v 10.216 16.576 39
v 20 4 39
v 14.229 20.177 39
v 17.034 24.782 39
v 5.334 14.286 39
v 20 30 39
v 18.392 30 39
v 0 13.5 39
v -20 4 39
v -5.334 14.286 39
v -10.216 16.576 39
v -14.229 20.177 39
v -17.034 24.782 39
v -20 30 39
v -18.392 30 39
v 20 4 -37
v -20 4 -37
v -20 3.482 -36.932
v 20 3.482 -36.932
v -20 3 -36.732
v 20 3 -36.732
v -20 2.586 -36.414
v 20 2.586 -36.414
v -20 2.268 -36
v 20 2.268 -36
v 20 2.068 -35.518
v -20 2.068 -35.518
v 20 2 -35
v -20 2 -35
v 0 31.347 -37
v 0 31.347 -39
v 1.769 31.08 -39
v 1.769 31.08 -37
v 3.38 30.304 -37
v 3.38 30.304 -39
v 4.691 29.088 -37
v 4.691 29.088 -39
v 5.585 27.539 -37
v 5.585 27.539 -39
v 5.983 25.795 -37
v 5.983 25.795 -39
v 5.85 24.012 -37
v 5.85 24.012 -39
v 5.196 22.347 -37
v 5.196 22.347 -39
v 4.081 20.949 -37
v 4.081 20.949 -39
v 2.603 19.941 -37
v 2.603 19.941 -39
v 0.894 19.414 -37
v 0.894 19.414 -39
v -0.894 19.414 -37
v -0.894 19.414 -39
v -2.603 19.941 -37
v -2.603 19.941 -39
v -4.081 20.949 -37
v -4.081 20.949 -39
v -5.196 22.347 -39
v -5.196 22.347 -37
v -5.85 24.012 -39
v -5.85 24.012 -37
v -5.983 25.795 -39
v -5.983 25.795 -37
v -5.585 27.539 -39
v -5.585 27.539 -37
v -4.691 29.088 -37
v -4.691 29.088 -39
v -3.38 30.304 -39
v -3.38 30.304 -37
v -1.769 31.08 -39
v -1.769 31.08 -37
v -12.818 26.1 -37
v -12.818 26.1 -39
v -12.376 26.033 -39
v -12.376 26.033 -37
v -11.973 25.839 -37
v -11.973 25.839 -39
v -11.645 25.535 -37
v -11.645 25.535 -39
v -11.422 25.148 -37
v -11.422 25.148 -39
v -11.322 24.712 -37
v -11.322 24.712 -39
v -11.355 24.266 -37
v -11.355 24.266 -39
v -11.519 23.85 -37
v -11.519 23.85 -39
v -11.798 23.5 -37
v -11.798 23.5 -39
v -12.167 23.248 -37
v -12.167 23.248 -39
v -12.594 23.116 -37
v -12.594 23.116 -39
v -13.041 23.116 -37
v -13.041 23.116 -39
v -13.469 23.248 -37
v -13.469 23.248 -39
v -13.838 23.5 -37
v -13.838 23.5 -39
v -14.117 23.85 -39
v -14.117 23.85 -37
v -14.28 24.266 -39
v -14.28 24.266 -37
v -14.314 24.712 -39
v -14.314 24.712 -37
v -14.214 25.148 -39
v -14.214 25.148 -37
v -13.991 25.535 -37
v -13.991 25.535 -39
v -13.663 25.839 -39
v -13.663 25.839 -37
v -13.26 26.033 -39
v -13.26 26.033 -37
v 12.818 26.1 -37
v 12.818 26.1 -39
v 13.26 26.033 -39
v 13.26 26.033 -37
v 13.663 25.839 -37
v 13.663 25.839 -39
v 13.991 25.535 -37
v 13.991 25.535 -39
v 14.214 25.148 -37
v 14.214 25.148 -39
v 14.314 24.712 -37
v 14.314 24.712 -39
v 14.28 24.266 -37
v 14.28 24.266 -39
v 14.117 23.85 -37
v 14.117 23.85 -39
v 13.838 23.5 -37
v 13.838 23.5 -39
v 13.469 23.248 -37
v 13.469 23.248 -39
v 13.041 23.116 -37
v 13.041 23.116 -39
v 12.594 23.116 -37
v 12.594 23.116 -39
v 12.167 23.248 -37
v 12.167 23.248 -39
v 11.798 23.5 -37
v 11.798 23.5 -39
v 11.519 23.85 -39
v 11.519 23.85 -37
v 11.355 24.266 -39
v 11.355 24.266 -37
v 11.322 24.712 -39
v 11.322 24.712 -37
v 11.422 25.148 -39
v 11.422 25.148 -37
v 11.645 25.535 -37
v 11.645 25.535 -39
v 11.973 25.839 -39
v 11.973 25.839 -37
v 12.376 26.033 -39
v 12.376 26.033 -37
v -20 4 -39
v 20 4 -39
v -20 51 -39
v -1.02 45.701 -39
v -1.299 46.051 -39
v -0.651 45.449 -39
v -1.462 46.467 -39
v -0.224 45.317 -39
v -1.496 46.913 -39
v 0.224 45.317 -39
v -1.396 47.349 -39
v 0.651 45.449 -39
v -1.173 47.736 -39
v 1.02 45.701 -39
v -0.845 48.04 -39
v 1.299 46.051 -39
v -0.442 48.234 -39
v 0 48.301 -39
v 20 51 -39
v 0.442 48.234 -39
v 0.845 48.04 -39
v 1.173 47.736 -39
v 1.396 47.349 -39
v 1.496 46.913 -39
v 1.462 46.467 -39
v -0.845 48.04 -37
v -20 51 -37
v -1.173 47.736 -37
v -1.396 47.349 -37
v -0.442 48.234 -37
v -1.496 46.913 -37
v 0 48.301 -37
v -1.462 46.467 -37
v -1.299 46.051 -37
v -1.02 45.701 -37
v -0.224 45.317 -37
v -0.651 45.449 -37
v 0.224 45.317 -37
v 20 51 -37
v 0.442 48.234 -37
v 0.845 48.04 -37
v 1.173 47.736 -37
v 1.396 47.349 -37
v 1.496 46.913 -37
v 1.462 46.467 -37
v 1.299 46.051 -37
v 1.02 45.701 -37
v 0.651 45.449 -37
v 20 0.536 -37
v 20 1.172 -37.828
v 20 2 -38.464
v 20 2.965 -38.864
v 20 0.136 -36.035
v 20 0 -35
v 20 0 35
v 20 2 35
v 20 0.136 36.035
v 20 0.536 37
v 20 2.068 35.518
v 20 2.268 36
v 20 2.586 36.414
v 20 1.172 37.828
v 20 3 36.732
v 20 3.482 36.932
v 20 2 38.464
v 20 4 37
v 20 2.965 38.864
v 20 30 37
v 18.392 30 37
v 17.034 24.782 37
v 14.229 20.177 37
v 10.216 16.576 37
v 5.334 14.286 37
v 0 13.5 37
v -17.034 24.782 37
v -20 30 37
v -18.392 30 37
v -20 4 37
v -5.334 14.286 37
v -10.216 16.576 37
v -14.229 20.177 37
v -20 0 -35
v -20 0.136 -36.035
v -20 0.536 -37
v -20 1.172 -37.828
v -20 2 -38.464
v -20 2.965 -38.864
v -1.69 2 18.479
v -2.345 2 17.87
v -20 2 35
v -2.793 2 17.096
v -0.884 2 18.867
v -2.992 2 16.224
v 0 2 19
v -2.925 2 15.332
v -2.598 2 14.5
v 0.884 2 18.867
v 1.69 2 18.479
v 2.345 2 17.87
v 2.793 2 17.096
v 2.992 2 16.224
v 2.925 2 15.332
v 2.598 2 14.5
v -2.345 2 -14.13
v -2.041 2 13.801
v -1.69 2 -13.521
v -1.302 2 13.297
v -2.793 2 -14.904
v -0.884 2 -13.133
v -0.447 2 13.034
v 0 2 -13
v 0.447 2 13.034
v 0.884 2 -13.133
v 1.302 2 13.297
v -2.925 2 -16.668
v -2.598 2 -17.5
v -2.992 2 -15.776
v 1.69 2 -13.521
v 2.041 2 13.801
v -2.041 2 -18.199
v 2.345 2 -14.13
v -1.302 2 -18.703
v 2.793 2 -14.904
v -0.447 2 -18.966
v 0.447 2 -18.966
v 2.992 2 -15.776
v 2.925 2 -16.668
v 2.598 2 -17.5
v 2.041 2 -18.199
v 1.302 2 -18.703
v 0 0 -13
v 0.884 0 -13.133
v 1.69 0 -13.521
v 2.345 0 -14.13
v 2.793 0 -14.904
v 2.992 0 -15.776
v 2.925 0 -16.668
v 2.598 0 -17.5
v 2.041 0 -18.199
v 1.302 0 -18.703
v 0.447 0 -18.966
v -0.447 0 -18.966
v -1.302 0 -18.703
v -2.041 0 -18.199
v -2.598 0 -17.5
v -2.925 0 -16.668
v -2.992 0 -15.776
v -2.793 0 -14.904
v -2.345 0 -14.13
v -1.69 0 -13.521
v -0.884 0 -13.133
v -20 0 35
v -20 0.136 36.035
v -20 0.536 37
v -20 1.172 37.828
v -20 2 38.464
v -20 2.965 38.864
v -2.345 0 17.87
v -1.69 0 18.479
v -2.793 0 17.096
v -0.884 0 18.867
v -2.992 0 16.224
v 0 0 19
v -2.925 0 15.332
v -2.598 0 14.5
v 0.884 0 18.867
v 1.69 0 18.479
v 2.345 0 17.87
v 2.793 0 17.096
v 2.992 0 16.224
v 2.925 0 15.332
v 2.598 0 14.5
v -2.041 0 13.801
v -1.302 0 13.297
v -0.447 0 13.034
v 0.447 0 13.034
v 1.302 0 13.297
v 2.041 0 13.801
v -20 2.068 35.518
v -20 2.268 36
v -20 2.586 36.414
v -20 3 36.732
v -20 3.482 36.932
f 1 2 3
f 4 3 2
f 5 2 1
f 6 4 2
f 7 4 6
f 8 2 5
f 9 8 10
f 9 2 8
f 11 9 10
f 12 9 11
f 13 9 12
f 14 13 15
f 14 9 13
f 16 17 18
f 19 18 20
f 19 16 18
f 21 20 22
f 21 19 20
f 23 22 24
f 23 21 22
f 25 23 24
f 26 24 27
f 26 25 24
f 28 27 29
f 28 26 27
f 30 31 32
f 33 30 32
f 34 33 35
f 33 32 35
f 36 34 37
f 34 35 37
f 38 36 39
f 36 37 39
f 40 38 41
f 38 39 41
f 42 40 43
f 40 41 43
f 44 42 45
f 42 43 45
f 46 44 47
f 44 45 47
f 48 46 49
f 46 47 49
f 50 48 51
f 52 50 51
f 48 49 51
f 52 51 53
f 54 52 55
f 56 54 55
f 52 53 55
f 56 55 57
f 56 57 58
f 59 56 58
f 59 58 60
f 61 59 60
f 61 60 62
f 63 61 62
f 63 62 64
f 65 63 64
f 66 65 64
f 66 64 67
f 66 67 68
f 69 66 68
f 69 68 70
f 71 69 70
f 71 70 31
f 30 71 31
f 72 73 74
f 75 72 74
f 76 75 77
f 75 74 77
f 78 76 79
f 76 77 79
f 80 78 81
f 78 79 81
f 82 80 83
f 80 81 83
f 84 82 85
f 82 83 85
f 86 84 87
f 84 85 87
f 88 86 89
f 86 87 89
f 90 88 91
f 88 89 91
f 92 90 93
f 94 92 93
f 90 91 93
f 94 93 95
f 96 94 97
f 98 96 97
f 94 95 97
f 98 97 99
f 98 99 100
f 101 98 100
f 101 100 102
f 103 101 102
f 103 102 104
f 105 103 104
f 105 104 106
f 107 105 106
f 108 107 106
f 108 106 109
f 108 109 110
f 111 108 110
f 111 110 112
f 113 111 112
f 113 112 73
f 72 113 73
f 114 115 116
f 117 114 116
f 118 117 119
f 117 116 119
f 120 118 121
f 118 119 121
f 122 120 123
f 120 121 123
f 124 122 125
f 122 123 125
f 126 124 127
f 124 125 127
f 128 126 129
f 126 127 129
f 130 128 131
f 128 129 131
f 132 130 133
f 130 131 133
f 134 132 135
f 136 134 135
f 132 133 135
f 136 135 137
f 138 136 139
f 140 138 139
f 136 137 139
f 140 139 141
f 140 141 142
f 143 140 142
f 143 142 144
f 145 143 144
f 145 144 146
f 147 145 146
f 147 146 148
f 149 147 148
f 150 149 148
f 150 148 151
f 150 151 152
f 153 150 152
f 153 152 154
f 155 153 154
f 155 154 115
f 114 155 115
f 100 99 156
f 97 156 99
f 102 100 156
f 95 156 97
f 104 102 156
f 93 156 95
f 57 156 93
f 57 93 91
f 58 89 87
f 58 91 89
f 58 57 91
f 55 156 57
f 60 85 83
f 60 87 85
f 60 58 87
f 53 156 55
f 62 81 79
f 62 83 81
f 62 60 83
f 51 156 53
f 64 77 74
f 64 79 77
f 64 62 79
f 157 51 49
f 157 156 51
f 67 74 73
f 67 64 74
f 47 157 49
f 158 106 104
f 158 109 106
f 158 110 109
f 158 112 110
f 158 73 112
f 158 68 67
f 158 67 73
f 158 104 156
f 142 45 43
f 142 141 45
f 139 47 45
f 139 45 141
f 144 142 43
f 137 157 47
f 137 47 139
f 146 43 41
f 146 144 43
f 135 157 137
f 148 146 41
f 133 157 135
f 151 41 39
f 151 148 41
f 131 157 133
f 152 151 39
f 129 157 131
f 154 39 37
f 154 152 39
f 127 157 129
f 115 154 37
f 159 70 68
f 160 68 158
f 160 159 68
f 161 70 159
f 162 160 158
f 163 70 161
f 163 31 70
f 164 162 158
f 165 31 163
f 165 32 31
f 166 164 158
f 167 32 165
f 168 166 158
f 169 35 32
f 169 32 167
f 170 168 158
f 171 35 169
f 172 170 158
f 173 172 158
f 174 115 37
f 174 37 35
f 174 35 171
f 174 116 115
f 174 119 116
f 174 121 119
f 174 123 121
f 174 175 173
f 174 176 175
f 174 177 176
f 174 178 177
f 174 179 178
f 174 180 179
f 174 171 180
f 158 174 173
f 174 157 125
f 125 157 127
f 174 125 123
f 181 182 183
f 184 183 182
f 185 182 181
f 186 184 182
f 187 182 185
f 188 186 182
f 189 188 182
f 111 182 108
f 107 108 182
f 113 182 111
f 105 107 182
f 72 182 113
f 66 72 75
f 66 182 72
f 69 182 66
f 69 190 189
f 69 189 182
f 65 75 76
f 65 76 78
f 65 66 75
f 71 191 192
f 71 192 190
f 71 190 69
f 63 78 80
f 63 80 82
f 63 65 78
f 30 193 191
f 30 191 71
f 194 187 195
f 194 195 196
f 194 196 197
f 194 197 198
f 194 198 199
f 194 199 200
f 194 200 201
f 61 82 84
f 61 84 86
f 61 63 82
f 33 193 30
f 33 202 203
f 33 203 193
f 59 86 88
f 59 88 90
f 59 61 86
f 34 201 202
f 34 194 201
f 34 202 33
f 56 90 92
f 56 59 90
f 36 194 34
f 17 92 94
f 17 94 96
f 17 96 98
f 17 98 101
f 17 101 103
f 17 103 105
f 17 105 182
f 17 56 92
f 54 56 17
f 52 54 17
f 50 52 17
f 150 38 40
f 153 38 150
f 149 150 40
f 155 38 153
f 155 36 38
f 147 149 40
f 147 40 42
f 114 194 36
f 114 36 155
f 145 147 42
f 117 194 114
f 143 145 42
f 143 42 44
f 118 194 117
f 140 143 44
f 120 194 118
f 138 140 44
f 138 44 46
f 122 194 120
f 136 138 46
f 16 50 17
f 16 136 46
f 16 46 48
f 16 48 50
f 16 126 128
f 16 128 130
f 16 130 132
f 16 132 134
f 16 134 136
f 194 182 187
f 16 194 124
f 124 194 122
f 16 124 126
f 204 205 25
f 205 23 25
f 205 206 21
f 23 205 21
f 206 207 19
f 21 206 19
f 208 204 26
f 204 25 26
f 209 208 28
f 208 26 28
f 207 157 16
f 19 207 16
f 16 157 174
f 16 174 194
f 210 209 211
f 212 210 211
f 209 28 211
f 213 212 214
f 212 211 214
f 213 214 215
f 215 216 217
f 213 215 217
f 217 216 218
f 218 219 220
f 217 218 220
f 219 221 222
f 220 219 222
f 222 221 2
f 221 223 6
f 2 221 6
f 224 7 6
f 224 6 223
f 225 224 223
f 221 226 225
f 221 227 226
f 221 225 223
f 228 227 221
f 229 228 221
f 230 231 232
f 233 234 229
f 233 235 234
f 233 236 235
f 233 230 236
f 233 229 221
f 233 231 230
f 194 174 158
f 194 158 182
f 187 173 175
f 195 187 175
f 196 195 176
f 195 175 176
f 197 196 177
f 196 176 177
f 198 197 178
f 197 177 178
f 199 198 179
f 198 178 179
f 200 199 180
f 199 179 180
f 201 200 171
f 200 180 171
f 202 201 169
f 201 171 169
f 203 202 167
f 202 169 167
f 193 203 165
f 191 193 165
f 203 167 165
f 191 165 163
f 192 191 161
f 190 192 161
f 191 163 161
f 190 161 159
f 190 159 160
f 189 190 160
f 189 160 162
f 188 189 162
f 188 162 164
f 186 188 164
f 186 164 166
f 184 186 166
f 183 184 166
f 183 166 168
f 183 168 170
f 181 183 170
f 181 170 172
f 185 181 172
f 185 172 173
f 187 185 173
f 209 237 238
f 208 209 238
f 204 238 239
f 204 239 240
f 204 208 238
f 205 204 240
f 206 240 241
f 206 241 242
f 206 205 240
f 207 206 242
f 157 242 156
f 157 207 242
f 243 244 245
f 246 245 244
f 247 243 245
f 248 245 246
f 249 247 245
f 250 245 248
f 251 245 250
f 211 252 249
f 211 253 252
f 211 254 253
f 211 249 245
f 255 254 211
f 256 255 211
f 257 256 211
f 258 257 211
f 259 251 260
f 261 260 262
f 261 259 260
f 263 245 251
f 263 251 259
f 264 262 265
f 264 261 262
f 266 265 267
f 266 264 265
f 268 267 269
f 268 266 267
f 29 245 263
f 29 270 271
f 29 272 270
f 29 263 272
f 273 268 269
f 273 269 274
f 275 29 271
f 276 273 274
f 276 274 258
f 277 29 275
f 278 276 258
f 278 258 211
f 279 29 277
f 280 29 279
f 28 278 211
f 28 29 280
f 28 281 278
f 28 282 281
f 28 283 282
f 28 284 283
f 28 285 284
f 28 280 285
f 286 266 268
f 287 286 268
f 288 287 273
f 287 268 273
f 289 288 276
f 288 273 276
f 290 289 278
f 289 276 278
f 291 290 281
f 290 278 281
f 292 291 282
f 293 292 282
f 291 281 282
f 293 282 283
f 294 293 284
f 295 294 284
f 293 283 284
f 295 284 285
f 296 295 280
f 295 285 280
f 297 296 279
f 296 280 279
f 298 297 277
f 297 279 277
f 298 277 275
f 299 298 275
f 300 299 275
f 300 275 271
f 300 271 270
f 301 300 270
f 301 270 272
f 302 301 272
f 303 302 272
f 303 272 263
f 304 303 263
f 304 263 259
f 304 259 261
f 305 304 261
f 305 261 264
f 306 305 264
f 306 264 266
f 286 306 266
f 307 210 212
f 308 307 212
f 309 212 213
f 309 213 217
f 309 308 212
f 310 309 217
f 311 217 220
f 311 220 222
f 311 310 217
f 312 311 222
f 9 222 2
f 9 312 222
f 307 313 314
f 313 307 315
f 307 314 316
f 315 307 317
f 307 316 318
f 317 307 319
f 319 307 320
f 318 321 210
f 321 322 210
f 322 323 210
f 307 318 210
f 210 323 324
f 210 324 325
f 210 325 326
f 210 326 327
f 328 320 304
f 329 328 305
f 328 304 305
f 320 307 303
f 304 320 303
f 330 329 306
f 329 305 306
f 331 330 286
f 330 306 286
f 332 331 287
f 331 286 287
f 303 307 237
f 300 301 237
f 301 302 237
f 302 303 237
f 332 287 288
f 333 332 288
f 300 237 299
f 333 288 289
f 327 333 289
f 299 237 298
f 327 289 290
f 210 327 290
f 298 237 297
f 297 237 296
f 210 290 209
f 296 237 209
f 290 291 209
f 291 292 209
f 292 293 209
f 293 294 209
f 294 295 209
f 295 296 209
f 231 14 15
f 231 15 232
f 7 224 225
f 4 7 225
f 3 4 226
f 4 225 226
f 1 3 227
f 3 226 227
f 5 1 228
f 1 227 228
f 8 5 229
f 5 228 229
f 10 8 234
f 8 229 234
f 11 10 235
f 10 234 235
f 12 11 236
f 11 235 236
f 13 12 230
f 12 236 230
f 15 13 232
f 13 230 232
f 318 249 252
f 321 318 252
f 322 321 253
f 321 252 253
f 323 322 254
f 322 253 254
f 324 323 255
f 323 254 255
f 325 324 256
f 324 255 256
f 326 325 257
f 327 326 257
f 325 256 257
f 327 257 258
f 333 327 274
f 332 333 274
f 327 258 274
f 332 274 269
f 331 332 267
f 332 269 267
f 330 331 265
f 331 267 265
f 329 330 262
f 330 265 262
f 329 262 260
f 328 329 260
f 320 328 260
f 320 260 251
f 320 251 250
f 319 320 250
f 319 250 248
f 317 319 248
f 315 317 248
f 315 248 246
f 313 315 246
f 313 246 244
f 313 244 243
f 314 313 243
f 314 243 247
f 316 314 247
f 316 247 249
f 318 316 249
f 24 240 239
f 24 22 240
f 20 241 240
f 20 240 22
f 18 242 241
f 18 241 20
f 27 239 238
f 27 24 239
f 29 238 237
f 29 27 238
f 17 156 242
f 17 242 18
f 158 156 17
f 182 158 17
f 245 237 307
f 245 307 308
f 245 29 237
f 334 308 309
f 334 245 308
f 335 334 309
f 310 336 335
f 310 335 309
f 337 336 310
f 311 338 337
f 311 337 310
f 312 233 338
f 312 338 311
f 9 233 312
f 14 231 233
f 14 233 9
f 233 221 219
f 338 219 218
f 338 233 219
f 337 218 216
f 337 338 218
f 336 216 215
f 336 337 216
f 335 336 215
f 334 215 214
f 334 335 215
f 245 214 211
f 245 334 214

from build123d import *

# Parameters (mm, degrees)
SKETCH44_W          = 40
SKETCH44_H          = 70
BOSS_EXTRUDE1_DEPTH = 2
EDGE_FLANGE6_DEPTH  = 40
SKETCH52_R          = 6
SKETCH52_R_2        = 1.5
CUT_EXTRUDE5_DEPTH  = 25
SKETCH54_R          = 3
CUT_EXTRUDE6_DEPTH  = 11
EDGE_FLANGE7_DEPTH  = 40
CUT_EXTRUDE8_START  = -10
SKETCH52_4_R        = 18.5
CUT_EXTRUDE8_DEPTH  = 84


# Sheet-metal steps are written as plain solids
with BuildPart() as part:
    # Sketch44 → Boss-Extrude1 (new body)
    with BuildSketch(Plane(origin=(0, 0, 0), x_dir=(1, 0, 0), z_dir=(0, 1, 0))):
        Rectangle(SKETCH44_W, SKETCH44_H)
    extrude(amount=BOSS_EXTRUDE1_DEPTH)

    # Edge-Flange6 section (across the edge) → Edge-Flange6 (add)
    with BuildSketch(Plane(origin=(20, 2, -37), x_dir=(0, 0, 1), z_dir=(-1, 0, 0))):
        with BuildLine():
            Line((-2, 2), (-2, 49))
            Line((-2, 49), (0, 49))
            Line((0, 49), (0, 2))
            ThreePointArc((0, 2), (0.585786438, 0.585786438), (2, 0))
            Line((2, 0), (2, -2))
            ThreePointArc((2, -2), (-0.828427125, -0.828427125), (-2, 2))
        make_face()
    extrude(amount=EDGE_FLANGE6_DEPTH)

    # Sketch52 → Cut-Extrude5 (cut)
    with BuildSketch(Plane(origin=(0, 0, -39), x_dir=(-1, 0, 0), z_dir=(0, 0, -1))):
        with Locations(Location((0, 25.347000811, 0), (0, 0, 90))):
            Circle(SKETCH52_R)
        with Locations(Location((0, 46.800736891, 0), (0, 0, 90))):
            Circle(SKETCH52_R_2)
        with Locations(Location((-12.817814142, 24.599631554, 0), (0, 0, 90))):
            Circle(SKETCH52_R_2)
        with Locations(Location((12.817814142, 24.599631554, 0), (0, 0, 90))):
            Circle(SKETCH52_R_2)
    extrude(amount=-CUT_EXTRUDE5_DEPTH, mode=Mode.SUBTRACT)

    # Sketch54 → Cut-Extrude6 (cut)
    with BuildSketch(Plane(origin=(0, 2, 0), x_dir=(1, 0, 0), z_dir=(0, 1, 0))):
        with Locations(Location((0, 16, 0), (0, 0, 270))):
            Circle(SKETCH54_R)
        with Locations(Location((0, -16, 0), (0, 0, 270))):
            Circle(SKETCH54_R)
    extrude(amount=-CUT_EXTRUDE6_DEPTH, mode=Mode.SUBTRACT)

    # Edge-Flange7 section (across the edge) → Edge-Flange7 (add)
    with BuildSketch(Plane(origin=(-20, 2, 37), x_dir=(0, 0, -1), z_dir=(1, 0, 0))):
        with BuildLine():
            Line((-2, 2), (-2, 28))
            Line((-2, 28), (0, 28))
            Line((0, 28), (0, 2))
            ThreePointArc((0, 2), (0.585786438, 0.585786438), (2, 0))
            Line((2, 0), (2, -2))
            ThreePointArc((2, -2), (-0.828427125, -0.828427125), (-2, 2))
        make_face()
    extrude(amount=EDGE_FLANGE7_DEPTH)

    # Sketch52<4> → Cut-Extrude8 (cut)
    with BuildSketch(Plane(origin=(0, 0, -39), x_dir=(-1, 0, 0), z_dir=(0, 0, -1)).offset(CUT_EXTRUDE8_START)):
        with Locations((0, 32)):
            Circle(SKETCH52_4_R)
    extrude(amount=-CUT_EXTRUDE8_DEPTH, mode=Mode.SUBTRACT)


solid = part.part
